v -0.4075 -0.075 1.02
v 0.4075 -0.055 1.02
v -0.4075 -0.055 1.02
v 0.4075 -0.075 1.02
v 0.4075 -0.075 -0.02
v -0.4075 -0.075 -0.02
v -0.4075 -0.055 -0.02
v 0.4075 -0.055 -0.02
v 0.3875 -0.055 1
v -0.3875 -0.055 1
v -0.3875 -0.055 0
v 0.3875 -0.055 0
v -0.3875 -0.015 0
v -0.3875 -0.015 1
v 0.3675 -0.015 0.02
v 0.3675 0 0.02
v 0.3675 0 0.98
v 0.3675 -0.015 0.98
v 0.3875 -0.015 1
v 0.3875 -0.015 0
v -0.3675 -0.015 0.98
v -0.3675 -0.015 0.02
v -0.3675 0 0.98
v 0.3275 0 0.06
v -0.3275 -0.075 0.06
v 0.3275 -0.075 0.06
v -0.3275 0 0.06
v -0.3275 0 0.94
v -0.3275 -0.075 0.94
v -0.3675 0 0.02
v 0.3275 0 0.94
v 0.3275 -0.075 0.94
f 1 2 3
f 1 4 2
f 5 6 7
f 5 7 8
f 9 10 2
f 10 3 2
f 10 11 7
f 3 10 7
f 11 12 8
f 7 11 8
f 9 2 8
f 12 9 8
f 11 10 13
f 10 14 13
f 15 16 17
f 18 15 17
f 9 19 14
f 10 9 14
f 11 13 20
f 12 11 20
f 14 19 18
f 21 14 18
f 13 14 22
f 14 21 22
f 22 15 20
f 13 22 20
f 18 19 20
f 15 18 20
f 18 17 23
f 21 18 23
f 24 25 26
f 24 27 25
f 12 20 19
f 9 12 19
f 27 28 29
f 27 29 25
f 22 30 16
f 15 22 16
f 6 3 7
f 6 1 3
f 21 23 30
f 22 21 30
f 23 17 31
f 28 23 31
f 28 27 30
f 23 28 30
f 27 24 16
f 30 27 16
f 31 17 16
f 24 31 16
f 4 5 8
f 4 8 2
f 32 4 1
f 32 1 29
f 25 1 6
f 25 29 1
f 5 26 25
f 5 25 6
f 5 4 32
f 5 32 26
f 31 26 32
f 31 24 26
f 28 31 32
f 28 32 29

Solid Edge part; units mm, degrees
sketch "Sketch1" plane through (0, 0, 0) normal (0, -1, 0) x (1, 0, 0)
  line L0 (-0.3875, 0) -> (0.3875, 0)
  line L1 (0.3875, 0) -> (0.3875, 1)
  line L2 (0.3875, 1) -> (-0.3875, 1)
  line L3 (-0.3875, 1) -> (-0.3875, 0)
  dimension "D1" = 1
  dimension "D2" = 0.775
extrude "Protrusion1" add sketch "Sketch1" along normal blind 0.075
sketch "Sketch2" plane through (0, 0, 0.69) normal (0, 1, 0) x (-1, 0, 0)
  line L0 (-0.3275, 0.25) -> (0.3275, 0.25)
  line L1 (0.3275, 0.25) -> (0.3275, -0.63)
  line L2 (0.3275, -0.63) -> (-0.3275, -0.63)
  line L3 (-0.3275, -0.63) -> (-0.3275, 0.25)
extrude "Cutout1" cut sketch "Sketch2" against normal up to next
sketch "Sketch3" plane through (0, 0, 0.69) normal (0, 1, 0) x (-1, 0, 0)
  line L0 (-0.3675, -0.67) -> (-0.3675, 0.29)
  line L1 (-0.3675, 0.29) -> (0.3675, 0.29)
  line L2 (0.3675, 0.29) -> (0.3675, -0.67)
  line L3 (0.3675, -0.67) -> (-0.3675, -0.67)
  line L4 (-0.3875, -0.69) -> (-0.3875, 0.31)
  line L5 (-0.3875, 0.31) -> (0.3875, 0.31)
  line L6 (0.3875, 0.31) -> (0.3875, -0.69)
  line L7 (0.3875, -0.69) -> (-0.3875, -0.69)
extrude "Ausschnitt_1" cut sketch "Sketch3" against normal blind 0.015
sketch "Sketch4" plane through (0, -0.075, 0.69) normal (0, -1, 0) x (1, 0, 0)
  line L0 (-0.4075, 0.33) -> (-0.4075, -0.71)
  line L1 (-0.4075, -0.71) -> (0.4075, -0.71)
  line L2 (0.4075, -0.71) -> (0.4075, 0.33)
  line L3 (0.4075, 0.33) -> (-0.4075, 0.33)
  line L4 (0.3875, 0.31) -> (-0.3875, 0.31)
  line L5 (-0.3875, 0.31) -> (-0.3875, -0.69)
  line L6 (-0.3875, -0.69) -> (0.3875, -0.69)
  line L7 (0.3875, -0.69) -> (0.3875, 0.31)
extrude "Ausprägung_2" add sketch "Sketch4" against normal blind 0.02
